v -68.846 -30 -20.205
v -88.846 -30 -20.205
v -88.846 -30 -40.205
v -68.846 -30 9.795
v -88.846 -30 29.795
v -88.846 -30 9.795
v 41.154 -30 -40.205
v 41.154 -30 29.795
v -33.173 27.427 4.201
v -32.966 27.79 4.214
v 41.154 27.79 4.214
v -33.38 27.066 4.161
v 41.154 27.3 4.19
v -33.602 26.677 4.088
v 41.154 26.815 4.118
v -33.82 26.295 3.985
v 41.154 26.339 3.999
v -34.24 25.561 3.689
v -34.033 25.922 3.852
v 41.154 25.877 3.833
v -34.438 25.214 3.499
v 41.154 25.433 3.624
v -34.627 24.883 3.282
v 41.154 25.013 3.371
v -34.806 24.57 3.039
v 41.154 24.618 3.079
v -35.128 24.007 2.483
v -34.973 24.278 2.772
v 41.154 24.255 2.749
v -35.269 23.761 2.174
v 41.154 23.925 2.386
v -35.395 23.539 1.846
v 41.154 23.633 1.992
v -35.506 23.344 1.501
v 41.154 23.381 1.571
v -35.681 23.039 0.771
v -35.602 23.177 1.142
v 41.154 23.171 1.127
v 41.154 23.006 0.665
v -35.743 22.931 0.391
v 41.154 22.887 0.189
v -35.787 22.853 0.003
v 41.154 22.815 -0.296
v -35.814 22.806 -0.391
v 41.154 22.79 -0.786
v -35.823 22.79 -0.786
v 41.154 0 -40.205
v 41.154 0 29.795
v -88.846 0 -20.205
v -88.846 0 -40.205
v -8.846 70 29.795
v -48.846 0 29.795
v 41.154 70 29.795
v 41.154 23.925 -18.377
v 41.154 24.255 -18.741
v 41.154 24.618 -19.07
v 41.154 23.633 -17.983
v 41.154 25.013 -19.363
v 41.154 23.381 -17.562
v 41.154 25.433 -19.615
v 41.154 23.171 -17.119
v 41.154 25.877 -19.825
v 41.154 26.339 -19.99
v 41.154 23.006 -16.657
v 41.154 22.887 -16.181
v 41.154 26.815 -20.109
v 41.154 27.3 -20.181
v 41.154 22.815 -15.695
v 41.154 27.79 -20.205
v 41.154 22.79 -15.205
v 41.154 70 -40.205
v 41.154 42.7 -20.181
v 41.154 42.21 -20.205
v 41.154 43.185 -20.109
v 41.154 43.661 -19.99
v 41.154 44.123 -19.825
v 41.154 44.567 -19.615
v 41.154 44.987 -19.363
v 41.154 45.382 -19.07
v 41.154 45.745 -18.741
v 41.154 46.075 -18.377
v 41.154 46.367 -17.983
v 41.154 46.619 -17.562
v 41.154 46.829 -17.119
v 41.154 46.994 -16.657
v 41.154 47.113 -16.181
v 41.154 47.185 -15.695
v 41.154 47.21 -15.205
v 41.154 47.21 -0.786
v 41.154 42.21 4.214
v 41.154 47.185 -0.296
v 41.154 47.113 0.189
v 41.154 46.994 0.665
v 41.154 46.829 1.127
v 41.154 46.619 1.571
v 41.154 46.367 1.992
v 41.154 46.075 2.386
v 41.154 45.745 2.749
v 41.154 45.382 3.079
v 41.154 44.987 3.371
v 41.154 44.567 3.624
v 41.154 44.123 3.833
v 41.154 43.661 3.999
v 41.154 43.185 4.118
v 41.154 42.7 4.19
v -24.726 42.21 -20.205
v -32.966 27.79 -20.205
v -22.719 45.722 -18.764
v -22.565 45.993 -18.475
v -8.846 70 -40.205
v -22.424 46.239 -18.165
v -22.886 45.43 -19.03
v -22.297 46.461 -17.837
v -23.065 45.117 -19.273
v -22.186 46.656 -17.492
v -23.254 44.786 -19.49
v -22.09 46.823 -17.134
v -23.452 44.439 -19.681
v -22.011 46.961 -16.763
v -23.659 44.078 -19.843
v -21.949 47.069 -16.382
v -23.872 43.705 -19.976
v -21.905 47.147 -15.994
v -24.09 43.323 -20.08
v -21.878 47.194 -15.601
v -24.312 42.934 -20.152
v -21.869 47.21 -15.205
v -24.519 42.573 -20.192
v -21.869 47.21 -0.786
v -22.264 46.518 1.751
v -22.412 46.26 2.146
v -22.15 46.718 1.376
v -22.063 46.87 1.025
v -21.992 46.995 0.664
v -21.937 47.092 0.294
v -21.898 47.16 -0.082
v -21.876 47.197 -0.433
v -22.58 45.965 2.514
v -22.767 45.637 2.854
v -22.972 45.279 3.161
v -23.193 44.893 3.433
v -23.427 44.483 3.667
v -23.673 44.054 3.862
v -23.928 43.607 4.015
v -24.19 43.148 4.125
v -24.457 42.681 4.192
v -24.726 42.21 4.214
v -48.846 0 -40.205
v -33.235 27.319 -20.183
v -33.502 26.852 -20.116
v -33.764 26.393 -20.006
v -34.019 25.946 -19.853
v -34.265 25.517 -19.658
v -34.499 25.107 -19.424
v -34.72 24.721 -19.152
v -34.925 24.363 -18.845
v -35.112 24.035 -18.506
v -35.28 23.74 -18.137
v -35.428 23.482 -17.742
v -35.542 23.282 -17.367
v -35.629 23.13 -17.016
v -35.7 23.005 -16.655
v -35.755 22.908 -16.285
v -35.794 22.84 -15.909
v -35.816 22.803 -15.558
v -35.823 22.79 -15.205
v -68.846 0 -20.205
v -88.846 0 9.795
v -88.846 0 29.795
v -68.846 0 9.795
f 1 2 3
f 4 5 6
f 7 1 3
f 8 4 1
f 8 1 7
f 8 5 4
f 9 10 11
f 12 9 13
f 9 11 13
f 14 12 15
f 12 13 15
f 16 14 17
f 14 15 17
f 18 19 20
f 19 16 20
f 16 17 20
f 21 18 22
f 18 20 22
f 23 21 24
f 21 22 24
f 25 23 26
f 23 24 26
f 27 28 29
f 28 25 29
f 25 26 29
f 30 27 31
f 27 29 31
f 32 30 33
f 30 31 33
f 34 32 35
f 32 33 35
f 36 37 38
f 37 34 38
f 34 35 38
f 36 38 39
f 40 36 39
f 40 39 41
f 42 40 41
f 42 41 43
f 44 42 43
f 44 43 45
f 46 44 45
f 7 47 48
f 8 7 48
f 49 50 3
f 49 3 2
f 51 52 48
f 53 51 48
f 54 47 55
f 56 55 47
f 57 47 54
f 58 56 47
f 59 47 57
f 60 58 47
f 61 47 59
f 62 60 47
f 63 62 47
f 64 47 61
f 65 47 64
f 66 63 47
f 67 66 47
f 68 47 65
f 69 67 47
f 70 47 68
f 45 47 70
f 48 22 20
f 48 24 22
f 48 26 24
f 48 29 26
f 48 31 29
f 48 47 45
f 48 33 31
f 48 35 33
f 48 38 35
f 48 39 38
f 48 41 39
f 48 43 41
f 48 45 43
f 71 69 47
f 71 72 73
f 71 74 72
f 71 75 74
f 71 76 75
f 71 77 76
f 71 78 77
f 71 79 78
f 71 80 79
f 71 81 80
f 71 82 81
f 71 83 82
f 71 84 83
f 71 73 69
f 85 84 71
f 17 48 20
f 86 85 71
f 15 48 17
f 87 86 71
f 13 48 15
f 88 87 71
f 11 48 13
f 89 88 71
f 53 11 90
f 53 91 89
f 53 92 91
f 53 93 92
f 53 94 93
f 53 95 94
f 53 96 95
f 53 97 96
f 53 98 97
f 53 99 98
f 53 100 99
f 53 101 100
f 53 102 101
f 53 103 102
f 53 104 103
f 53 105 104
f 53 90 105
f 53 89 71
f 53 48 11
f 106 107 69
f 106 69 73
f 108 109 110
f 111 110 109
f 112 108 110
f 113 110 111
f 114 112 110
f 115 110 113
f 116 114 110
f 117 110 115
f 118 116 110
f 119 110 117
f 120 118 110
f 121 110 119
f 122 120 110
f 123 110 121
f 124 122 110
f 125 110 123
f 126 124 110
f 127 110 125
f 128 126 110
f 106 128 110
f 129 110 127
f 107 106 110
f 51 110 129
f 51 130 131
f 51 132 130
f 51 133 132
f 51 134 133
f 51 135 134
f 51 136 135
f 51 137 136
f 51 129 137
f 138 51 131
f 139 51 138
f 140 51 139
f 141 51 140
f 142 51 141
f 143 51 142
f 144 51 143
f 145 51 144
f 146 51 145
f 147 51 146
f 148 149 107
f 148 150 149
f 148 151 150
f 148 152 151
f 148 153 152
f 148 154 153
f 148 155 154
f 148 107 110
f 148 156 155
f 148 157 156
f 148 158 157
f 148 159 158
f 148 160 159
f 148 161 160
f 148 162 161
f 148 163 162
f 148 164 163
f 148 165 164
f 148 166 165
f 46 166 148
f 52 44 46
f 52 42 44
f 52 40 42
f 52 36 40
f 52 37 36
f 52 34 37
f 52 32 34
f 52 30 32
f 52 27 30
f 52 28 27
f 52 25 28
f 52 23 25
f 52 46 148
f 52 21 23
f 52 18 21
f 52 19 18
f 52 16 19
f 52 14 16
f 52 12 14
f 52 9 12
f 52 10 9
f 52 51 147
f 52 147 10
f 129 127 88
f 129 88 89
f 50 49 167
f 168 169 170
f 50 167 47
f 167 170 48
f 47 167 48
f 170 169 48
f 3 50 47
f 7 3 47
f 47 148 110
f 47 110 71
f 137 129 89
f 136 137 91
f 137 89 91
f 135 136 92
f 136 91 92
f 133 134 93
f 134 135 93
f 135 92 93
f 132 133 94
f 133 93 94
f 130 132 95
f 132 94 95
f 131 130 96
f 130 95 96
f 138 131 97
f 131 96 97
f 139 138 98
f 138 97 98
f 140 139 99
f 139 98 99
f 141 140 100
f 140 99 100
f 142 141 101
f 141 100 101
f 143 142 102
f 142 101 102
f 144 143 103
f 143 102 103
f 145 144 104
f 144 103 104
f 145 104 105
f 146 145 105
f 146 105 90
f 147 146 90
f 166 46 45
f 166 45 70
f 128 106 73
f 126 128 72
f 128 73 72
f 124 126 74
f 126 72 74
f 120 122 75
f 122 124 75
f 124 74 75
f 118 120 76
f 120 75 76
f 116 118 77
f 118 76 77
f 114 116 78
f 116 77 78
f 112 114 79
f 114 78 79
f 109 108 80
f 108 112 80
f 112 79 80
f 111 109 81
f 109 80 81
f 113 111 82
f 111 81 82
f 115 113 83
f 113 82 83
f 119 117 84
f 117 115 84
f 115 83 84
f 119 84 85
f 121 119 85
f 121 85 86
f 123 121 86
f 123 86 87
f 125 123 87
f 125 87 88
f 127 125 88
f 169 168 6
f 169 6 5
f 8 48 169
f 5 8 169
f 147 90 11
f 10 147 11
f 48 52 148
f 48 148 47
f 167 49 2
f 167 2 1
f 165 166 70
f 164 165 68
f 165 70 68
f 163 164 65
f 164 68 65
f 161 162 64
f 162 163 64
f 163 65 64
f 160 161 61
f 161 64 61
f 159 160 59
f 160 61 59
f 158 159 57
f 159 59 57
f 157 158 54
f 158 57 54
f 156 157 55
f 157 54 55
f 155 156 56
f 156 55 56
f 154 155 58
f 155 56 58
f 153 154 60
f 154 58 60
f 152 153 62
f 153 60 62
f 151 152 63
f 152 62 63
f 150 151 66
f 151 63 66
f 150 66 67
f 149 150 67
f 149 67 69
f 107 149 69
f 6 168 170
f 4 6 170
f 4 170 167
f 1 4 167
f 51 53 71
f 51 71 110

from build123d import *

# Parameters (mm, degrees)
F0_W     = 20
F0_H     = 20
F1_DEPTH = 30
F3_DEPTH = 70
F5_DEPTH = 1000


with BuildPart() as f1:
    # F0 (on Front) → F1 (new body)
    with BuildSketch(Plane.XZ):
        with Locations((-78.84601, 19.794804)):
            Rectangle(F0_W, F0_H)
        Polygon((41.15399, 29.794804), (-68.84601, 29.794804), (-68.84601, 9.794804), (-68.84601, -20.205196), (-68.84601, -40.205196), (41.15399, -40.205196), align=None)
        with Locations((-78.84601, -30.205196)):
            Rectangle(F0_W, F0_H)
    extrude(amount=F1_DEPTH)


with BuildPart() as f3:
    # F2 (on face) → F3 (new body)
    with BuildSketch(Plane.XY.offset(29.794804)):
        Polygon((-48.84601, 0), (41.15399, 0), (41.15399, 70), (-8.84601, 70), align=None)
    extrude(amount=-F3_DEPTH)

    # F4 (on face) → F5 (cut)
    with BuildSketch(Plane.YZ.offset(41.15399)):
        with BuildLine():
            ThreePointArc((27.790433, 4.213938), (24.254899, 2.749472), (22.790433, -0.786062))
            Line((22.790433, -0.786062), (22.790433, -15.205196))
            ThreePointArc((22.790433, -15.205196), (24.254899, -18.740729), (27.790433, -20.205196))
            Line((27.790433, -20.205196), (42.209567, -20.205196))
            ThreePointArc((42.209567, -20.205196), (45.745101, -18.740729), (47.209567, -15.205196))
            Line((47.209567, -15.205196), (47.209567, -0.786062))
            ThreePointArc((47.209567, -0.786062), (45.745101, 2.749472), (42.209567, 4.213938))
            Line((42.209567, 4.213938), (27.790433, 4.213938))
        make_face()
    extrude(amount=-F5_DEPTH, mode=Mode.SUBTRACT)


solid = Compound([f1.part, f3.part])
